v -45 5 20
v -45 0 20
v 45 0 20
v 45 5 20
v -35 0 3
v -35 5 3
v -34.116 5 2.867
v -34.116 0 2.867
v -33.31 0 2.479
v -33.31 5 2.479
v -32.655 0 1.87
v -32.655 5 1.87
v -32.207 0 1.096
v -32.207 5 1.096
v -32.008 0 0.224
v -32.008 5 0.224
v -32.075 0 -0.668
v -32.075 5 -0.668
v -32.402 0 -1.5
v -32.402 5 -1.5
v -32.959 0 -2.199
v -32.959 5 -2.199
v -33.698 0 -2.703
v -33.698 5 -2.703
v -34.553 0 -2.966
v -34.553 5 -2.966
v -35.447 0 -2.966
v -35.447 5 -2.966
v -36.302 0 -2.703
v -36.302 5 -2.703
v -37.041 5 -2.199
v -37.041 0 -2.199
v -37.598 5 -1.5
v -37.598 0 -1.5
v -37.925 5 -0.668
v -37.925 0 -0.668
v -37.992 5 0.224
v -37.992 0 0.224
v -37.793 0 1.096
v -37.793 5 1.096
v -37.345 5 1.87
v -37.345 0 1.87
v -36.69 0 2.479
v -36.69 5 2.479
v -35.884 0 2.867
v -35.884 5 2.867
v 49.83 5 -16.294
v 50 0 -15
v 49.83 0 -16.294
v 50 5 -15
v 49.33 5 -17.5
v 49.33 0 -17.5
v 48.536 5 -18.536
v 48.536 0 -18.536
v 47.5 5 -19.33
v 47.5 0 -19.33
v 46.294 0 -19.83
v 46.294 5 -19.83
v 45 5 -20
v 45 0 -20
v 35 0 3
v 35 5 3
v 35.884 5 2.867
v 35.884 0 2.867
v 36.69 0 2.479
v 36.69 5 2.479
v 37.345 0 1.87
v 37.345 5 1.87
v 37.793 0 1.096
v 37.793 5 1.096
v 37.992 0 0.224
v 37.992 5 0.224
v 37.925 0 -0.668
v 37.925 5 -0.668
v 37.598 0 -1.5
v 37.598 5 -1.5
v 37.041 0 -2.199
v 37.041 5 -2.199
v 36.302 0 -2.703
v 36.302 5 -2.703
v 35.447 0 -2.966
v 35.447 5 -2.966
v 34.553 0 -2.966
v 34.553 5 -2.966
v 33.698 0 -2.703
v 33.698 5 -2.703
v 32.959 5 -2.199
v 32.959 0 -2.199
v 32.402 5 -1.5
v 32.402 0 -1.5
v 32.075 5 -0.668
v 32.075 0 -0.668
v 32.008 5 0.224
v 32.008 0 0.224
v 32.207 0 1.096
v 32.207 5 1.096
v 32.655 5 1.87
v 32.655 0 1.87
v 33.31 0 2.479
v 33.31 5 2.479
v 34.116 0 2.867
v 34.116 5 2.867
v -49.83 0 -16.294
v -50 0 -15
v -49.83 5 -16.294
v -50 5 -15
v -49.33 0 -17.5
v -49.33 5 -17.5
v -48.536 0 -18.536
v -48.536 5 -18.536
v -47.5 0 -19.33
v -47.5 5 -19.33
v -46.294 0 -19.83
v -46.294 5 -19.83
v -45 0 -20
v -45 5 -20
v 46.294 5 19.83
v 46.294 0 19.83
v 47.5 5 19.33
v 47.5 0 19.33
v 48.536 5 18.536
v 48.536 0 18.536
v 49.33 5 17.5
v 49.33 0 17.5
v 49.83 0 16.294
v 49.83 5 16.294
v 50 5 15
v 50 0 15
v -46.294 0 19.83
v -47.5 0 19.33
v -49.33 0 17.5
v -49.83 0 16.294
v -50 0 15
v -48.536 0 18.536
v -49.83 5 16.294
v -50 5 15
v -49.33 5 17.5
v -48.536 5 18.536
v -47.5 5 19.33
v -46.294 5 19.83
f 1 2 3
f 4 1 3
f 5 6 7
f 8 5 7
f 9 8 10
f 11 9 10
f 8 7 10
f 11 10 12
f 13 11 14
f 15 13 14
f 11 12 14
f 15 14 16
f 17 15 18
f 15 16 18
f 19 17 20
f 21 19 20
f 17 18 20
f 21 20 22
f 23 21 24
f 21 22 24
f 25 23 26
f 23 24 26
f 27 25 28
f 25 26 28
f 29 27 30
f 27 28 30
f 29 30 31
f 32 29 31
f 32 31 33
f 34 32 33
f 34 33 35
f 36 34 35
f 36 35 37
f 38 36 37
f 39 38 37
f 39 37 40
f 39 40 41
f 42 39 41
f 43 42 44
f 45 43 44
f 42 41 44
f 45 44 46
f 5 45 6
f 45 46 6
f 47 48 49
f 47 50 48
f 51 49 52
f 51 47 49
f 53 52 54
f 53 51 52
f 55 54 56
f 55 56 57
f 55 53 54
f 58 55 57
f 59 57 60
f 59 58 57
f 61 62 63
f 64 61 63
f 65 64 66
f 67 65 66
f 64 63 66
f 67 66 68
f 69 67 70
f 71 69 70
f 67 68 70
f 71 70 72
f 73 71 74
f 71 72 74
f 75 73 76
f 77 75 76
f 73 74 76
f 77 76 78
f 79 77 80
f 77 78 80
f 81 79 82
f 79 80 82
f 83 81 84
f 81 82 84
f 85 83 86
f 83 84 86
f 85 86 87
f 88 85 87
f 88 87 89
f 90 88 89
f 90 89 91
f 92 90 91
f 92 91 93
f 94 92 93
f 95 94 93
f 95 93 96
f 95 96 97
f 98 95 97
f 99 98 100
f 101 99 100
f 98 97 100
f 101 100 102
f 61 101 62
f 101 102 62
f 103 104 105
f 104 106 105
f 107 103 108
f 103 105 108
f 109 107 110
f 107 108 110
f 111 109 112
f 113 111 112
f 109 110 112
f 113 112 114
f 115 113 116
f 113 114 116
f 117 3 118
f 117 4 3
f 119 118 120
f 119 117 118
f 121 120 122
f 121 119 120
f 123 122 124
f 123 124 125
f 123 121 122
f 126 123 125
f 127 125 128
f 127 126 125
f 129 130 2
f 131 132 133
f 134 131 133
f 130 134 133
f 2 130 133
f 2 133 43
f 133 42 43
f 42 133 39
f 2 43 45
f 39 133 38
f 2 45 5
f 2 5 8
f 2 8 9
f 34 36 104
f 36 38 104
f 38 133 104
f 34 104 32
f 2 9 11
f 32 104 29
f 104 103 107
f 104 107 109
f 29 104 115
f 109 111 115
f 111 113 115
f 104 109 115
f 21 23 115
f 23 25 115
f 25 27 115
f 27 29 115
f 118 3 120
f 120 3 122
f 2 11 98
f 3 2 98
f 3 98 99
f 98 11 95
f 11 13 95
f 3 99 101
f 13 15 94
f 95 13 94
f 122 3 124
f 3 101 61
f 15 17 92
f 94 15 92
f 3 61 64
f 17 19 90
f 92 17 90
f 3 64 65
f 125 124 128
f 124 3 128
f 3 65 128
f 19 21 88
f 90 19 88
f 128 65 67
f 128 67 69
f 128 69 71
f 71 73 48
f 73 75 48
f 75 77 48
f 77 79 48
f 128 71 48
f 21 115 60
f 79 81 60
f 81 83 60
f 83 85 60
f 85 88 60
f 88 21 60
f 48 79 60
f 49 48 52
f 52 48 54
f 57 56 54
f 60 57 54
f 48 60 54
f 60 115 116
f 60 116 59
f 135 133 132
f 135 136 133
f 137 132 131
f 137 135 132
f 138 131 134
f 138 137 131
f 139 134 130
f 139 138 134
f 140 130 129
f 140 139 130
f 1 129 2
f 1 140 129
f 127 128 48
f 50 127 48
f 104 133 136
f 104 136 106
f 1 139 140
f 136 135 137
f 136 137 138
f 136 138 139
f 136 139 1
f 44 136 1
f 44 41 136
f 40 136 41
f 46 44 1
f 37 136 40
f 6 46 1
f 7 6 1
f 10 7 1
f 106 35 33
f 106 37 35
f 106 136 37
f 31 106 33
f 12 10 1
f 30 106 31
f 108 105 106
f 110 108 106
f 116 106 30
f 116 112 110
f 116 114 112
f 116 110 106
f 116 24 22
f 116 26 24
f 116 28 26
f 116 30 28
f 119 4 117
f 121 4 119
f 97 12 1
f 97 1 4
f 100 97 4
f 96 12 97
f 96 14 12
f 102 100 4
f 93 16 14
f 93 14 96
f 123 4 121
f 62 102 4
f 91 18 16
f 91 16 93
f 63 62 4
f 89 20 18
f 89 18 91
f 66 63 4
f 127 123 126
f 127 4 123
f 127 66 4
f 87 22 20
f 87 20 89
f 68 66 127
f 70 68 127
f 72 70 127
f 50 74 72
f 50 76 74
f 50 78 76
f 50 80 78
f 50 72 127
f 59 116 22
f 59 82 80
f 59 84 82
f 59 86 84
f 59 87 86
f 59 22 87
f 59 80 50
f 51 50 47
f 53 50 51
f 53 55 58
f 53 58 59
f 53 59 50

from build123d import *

# Parameters (mm, degrees)
ESBO_O1_W                = 100
ESBO_O1_H                = 40
RESSALTO_EXTRUS_O1_DEPTH = 5
FILETE1_R                = 5
ESBO_O2_R                = 3
CORTE_EXTRUS_O1_DEPTH    = 5


with BuildPart() as part:
    # Esboço1 → Ressalto-extrusão1 (new body)
    with BuildSketch(Plane(origin=(0, 0, 0), x_dir=(1, 0, 0), z_dir=(0, 1, 0))):
        Rectangle(ESBO_O1_W, ESBO_O1_H)
    extrude(amount=RESSALTO_EXTRUS_O1_DEPTH)

    # Filete1
    filete1_edges = [part.edges().sort_by_distance(p)[0] for p in [
        (-50, 2.5, -20),
        (50, 2.5, -20),
        (50, 2.5, 20),
        (-50, 2.5, 20),
    ]]
    fillet(filete1_edges, radius=FILETE1_R)

    # Esboço2 → Corte-extrusão1 (cut)
    with BuildSketch(Plane(origin=(0, 5, 0), x_dir=(1, 0, 0), z_dir=(0, 1, 0))):
        with Locations(Location((-35, 0, 0), (0, 0, 270))):
            Circle(ESBO_O2_R)
        with Locations(Location((35, 0, 0), (0, 0, 270))):
            Circle(ESBO_O2_R)
    extrude(amount=-CORTE_EXTRUS_O1_DEPTH, mode=Mode.SUBTRACT)


solid = part.part
